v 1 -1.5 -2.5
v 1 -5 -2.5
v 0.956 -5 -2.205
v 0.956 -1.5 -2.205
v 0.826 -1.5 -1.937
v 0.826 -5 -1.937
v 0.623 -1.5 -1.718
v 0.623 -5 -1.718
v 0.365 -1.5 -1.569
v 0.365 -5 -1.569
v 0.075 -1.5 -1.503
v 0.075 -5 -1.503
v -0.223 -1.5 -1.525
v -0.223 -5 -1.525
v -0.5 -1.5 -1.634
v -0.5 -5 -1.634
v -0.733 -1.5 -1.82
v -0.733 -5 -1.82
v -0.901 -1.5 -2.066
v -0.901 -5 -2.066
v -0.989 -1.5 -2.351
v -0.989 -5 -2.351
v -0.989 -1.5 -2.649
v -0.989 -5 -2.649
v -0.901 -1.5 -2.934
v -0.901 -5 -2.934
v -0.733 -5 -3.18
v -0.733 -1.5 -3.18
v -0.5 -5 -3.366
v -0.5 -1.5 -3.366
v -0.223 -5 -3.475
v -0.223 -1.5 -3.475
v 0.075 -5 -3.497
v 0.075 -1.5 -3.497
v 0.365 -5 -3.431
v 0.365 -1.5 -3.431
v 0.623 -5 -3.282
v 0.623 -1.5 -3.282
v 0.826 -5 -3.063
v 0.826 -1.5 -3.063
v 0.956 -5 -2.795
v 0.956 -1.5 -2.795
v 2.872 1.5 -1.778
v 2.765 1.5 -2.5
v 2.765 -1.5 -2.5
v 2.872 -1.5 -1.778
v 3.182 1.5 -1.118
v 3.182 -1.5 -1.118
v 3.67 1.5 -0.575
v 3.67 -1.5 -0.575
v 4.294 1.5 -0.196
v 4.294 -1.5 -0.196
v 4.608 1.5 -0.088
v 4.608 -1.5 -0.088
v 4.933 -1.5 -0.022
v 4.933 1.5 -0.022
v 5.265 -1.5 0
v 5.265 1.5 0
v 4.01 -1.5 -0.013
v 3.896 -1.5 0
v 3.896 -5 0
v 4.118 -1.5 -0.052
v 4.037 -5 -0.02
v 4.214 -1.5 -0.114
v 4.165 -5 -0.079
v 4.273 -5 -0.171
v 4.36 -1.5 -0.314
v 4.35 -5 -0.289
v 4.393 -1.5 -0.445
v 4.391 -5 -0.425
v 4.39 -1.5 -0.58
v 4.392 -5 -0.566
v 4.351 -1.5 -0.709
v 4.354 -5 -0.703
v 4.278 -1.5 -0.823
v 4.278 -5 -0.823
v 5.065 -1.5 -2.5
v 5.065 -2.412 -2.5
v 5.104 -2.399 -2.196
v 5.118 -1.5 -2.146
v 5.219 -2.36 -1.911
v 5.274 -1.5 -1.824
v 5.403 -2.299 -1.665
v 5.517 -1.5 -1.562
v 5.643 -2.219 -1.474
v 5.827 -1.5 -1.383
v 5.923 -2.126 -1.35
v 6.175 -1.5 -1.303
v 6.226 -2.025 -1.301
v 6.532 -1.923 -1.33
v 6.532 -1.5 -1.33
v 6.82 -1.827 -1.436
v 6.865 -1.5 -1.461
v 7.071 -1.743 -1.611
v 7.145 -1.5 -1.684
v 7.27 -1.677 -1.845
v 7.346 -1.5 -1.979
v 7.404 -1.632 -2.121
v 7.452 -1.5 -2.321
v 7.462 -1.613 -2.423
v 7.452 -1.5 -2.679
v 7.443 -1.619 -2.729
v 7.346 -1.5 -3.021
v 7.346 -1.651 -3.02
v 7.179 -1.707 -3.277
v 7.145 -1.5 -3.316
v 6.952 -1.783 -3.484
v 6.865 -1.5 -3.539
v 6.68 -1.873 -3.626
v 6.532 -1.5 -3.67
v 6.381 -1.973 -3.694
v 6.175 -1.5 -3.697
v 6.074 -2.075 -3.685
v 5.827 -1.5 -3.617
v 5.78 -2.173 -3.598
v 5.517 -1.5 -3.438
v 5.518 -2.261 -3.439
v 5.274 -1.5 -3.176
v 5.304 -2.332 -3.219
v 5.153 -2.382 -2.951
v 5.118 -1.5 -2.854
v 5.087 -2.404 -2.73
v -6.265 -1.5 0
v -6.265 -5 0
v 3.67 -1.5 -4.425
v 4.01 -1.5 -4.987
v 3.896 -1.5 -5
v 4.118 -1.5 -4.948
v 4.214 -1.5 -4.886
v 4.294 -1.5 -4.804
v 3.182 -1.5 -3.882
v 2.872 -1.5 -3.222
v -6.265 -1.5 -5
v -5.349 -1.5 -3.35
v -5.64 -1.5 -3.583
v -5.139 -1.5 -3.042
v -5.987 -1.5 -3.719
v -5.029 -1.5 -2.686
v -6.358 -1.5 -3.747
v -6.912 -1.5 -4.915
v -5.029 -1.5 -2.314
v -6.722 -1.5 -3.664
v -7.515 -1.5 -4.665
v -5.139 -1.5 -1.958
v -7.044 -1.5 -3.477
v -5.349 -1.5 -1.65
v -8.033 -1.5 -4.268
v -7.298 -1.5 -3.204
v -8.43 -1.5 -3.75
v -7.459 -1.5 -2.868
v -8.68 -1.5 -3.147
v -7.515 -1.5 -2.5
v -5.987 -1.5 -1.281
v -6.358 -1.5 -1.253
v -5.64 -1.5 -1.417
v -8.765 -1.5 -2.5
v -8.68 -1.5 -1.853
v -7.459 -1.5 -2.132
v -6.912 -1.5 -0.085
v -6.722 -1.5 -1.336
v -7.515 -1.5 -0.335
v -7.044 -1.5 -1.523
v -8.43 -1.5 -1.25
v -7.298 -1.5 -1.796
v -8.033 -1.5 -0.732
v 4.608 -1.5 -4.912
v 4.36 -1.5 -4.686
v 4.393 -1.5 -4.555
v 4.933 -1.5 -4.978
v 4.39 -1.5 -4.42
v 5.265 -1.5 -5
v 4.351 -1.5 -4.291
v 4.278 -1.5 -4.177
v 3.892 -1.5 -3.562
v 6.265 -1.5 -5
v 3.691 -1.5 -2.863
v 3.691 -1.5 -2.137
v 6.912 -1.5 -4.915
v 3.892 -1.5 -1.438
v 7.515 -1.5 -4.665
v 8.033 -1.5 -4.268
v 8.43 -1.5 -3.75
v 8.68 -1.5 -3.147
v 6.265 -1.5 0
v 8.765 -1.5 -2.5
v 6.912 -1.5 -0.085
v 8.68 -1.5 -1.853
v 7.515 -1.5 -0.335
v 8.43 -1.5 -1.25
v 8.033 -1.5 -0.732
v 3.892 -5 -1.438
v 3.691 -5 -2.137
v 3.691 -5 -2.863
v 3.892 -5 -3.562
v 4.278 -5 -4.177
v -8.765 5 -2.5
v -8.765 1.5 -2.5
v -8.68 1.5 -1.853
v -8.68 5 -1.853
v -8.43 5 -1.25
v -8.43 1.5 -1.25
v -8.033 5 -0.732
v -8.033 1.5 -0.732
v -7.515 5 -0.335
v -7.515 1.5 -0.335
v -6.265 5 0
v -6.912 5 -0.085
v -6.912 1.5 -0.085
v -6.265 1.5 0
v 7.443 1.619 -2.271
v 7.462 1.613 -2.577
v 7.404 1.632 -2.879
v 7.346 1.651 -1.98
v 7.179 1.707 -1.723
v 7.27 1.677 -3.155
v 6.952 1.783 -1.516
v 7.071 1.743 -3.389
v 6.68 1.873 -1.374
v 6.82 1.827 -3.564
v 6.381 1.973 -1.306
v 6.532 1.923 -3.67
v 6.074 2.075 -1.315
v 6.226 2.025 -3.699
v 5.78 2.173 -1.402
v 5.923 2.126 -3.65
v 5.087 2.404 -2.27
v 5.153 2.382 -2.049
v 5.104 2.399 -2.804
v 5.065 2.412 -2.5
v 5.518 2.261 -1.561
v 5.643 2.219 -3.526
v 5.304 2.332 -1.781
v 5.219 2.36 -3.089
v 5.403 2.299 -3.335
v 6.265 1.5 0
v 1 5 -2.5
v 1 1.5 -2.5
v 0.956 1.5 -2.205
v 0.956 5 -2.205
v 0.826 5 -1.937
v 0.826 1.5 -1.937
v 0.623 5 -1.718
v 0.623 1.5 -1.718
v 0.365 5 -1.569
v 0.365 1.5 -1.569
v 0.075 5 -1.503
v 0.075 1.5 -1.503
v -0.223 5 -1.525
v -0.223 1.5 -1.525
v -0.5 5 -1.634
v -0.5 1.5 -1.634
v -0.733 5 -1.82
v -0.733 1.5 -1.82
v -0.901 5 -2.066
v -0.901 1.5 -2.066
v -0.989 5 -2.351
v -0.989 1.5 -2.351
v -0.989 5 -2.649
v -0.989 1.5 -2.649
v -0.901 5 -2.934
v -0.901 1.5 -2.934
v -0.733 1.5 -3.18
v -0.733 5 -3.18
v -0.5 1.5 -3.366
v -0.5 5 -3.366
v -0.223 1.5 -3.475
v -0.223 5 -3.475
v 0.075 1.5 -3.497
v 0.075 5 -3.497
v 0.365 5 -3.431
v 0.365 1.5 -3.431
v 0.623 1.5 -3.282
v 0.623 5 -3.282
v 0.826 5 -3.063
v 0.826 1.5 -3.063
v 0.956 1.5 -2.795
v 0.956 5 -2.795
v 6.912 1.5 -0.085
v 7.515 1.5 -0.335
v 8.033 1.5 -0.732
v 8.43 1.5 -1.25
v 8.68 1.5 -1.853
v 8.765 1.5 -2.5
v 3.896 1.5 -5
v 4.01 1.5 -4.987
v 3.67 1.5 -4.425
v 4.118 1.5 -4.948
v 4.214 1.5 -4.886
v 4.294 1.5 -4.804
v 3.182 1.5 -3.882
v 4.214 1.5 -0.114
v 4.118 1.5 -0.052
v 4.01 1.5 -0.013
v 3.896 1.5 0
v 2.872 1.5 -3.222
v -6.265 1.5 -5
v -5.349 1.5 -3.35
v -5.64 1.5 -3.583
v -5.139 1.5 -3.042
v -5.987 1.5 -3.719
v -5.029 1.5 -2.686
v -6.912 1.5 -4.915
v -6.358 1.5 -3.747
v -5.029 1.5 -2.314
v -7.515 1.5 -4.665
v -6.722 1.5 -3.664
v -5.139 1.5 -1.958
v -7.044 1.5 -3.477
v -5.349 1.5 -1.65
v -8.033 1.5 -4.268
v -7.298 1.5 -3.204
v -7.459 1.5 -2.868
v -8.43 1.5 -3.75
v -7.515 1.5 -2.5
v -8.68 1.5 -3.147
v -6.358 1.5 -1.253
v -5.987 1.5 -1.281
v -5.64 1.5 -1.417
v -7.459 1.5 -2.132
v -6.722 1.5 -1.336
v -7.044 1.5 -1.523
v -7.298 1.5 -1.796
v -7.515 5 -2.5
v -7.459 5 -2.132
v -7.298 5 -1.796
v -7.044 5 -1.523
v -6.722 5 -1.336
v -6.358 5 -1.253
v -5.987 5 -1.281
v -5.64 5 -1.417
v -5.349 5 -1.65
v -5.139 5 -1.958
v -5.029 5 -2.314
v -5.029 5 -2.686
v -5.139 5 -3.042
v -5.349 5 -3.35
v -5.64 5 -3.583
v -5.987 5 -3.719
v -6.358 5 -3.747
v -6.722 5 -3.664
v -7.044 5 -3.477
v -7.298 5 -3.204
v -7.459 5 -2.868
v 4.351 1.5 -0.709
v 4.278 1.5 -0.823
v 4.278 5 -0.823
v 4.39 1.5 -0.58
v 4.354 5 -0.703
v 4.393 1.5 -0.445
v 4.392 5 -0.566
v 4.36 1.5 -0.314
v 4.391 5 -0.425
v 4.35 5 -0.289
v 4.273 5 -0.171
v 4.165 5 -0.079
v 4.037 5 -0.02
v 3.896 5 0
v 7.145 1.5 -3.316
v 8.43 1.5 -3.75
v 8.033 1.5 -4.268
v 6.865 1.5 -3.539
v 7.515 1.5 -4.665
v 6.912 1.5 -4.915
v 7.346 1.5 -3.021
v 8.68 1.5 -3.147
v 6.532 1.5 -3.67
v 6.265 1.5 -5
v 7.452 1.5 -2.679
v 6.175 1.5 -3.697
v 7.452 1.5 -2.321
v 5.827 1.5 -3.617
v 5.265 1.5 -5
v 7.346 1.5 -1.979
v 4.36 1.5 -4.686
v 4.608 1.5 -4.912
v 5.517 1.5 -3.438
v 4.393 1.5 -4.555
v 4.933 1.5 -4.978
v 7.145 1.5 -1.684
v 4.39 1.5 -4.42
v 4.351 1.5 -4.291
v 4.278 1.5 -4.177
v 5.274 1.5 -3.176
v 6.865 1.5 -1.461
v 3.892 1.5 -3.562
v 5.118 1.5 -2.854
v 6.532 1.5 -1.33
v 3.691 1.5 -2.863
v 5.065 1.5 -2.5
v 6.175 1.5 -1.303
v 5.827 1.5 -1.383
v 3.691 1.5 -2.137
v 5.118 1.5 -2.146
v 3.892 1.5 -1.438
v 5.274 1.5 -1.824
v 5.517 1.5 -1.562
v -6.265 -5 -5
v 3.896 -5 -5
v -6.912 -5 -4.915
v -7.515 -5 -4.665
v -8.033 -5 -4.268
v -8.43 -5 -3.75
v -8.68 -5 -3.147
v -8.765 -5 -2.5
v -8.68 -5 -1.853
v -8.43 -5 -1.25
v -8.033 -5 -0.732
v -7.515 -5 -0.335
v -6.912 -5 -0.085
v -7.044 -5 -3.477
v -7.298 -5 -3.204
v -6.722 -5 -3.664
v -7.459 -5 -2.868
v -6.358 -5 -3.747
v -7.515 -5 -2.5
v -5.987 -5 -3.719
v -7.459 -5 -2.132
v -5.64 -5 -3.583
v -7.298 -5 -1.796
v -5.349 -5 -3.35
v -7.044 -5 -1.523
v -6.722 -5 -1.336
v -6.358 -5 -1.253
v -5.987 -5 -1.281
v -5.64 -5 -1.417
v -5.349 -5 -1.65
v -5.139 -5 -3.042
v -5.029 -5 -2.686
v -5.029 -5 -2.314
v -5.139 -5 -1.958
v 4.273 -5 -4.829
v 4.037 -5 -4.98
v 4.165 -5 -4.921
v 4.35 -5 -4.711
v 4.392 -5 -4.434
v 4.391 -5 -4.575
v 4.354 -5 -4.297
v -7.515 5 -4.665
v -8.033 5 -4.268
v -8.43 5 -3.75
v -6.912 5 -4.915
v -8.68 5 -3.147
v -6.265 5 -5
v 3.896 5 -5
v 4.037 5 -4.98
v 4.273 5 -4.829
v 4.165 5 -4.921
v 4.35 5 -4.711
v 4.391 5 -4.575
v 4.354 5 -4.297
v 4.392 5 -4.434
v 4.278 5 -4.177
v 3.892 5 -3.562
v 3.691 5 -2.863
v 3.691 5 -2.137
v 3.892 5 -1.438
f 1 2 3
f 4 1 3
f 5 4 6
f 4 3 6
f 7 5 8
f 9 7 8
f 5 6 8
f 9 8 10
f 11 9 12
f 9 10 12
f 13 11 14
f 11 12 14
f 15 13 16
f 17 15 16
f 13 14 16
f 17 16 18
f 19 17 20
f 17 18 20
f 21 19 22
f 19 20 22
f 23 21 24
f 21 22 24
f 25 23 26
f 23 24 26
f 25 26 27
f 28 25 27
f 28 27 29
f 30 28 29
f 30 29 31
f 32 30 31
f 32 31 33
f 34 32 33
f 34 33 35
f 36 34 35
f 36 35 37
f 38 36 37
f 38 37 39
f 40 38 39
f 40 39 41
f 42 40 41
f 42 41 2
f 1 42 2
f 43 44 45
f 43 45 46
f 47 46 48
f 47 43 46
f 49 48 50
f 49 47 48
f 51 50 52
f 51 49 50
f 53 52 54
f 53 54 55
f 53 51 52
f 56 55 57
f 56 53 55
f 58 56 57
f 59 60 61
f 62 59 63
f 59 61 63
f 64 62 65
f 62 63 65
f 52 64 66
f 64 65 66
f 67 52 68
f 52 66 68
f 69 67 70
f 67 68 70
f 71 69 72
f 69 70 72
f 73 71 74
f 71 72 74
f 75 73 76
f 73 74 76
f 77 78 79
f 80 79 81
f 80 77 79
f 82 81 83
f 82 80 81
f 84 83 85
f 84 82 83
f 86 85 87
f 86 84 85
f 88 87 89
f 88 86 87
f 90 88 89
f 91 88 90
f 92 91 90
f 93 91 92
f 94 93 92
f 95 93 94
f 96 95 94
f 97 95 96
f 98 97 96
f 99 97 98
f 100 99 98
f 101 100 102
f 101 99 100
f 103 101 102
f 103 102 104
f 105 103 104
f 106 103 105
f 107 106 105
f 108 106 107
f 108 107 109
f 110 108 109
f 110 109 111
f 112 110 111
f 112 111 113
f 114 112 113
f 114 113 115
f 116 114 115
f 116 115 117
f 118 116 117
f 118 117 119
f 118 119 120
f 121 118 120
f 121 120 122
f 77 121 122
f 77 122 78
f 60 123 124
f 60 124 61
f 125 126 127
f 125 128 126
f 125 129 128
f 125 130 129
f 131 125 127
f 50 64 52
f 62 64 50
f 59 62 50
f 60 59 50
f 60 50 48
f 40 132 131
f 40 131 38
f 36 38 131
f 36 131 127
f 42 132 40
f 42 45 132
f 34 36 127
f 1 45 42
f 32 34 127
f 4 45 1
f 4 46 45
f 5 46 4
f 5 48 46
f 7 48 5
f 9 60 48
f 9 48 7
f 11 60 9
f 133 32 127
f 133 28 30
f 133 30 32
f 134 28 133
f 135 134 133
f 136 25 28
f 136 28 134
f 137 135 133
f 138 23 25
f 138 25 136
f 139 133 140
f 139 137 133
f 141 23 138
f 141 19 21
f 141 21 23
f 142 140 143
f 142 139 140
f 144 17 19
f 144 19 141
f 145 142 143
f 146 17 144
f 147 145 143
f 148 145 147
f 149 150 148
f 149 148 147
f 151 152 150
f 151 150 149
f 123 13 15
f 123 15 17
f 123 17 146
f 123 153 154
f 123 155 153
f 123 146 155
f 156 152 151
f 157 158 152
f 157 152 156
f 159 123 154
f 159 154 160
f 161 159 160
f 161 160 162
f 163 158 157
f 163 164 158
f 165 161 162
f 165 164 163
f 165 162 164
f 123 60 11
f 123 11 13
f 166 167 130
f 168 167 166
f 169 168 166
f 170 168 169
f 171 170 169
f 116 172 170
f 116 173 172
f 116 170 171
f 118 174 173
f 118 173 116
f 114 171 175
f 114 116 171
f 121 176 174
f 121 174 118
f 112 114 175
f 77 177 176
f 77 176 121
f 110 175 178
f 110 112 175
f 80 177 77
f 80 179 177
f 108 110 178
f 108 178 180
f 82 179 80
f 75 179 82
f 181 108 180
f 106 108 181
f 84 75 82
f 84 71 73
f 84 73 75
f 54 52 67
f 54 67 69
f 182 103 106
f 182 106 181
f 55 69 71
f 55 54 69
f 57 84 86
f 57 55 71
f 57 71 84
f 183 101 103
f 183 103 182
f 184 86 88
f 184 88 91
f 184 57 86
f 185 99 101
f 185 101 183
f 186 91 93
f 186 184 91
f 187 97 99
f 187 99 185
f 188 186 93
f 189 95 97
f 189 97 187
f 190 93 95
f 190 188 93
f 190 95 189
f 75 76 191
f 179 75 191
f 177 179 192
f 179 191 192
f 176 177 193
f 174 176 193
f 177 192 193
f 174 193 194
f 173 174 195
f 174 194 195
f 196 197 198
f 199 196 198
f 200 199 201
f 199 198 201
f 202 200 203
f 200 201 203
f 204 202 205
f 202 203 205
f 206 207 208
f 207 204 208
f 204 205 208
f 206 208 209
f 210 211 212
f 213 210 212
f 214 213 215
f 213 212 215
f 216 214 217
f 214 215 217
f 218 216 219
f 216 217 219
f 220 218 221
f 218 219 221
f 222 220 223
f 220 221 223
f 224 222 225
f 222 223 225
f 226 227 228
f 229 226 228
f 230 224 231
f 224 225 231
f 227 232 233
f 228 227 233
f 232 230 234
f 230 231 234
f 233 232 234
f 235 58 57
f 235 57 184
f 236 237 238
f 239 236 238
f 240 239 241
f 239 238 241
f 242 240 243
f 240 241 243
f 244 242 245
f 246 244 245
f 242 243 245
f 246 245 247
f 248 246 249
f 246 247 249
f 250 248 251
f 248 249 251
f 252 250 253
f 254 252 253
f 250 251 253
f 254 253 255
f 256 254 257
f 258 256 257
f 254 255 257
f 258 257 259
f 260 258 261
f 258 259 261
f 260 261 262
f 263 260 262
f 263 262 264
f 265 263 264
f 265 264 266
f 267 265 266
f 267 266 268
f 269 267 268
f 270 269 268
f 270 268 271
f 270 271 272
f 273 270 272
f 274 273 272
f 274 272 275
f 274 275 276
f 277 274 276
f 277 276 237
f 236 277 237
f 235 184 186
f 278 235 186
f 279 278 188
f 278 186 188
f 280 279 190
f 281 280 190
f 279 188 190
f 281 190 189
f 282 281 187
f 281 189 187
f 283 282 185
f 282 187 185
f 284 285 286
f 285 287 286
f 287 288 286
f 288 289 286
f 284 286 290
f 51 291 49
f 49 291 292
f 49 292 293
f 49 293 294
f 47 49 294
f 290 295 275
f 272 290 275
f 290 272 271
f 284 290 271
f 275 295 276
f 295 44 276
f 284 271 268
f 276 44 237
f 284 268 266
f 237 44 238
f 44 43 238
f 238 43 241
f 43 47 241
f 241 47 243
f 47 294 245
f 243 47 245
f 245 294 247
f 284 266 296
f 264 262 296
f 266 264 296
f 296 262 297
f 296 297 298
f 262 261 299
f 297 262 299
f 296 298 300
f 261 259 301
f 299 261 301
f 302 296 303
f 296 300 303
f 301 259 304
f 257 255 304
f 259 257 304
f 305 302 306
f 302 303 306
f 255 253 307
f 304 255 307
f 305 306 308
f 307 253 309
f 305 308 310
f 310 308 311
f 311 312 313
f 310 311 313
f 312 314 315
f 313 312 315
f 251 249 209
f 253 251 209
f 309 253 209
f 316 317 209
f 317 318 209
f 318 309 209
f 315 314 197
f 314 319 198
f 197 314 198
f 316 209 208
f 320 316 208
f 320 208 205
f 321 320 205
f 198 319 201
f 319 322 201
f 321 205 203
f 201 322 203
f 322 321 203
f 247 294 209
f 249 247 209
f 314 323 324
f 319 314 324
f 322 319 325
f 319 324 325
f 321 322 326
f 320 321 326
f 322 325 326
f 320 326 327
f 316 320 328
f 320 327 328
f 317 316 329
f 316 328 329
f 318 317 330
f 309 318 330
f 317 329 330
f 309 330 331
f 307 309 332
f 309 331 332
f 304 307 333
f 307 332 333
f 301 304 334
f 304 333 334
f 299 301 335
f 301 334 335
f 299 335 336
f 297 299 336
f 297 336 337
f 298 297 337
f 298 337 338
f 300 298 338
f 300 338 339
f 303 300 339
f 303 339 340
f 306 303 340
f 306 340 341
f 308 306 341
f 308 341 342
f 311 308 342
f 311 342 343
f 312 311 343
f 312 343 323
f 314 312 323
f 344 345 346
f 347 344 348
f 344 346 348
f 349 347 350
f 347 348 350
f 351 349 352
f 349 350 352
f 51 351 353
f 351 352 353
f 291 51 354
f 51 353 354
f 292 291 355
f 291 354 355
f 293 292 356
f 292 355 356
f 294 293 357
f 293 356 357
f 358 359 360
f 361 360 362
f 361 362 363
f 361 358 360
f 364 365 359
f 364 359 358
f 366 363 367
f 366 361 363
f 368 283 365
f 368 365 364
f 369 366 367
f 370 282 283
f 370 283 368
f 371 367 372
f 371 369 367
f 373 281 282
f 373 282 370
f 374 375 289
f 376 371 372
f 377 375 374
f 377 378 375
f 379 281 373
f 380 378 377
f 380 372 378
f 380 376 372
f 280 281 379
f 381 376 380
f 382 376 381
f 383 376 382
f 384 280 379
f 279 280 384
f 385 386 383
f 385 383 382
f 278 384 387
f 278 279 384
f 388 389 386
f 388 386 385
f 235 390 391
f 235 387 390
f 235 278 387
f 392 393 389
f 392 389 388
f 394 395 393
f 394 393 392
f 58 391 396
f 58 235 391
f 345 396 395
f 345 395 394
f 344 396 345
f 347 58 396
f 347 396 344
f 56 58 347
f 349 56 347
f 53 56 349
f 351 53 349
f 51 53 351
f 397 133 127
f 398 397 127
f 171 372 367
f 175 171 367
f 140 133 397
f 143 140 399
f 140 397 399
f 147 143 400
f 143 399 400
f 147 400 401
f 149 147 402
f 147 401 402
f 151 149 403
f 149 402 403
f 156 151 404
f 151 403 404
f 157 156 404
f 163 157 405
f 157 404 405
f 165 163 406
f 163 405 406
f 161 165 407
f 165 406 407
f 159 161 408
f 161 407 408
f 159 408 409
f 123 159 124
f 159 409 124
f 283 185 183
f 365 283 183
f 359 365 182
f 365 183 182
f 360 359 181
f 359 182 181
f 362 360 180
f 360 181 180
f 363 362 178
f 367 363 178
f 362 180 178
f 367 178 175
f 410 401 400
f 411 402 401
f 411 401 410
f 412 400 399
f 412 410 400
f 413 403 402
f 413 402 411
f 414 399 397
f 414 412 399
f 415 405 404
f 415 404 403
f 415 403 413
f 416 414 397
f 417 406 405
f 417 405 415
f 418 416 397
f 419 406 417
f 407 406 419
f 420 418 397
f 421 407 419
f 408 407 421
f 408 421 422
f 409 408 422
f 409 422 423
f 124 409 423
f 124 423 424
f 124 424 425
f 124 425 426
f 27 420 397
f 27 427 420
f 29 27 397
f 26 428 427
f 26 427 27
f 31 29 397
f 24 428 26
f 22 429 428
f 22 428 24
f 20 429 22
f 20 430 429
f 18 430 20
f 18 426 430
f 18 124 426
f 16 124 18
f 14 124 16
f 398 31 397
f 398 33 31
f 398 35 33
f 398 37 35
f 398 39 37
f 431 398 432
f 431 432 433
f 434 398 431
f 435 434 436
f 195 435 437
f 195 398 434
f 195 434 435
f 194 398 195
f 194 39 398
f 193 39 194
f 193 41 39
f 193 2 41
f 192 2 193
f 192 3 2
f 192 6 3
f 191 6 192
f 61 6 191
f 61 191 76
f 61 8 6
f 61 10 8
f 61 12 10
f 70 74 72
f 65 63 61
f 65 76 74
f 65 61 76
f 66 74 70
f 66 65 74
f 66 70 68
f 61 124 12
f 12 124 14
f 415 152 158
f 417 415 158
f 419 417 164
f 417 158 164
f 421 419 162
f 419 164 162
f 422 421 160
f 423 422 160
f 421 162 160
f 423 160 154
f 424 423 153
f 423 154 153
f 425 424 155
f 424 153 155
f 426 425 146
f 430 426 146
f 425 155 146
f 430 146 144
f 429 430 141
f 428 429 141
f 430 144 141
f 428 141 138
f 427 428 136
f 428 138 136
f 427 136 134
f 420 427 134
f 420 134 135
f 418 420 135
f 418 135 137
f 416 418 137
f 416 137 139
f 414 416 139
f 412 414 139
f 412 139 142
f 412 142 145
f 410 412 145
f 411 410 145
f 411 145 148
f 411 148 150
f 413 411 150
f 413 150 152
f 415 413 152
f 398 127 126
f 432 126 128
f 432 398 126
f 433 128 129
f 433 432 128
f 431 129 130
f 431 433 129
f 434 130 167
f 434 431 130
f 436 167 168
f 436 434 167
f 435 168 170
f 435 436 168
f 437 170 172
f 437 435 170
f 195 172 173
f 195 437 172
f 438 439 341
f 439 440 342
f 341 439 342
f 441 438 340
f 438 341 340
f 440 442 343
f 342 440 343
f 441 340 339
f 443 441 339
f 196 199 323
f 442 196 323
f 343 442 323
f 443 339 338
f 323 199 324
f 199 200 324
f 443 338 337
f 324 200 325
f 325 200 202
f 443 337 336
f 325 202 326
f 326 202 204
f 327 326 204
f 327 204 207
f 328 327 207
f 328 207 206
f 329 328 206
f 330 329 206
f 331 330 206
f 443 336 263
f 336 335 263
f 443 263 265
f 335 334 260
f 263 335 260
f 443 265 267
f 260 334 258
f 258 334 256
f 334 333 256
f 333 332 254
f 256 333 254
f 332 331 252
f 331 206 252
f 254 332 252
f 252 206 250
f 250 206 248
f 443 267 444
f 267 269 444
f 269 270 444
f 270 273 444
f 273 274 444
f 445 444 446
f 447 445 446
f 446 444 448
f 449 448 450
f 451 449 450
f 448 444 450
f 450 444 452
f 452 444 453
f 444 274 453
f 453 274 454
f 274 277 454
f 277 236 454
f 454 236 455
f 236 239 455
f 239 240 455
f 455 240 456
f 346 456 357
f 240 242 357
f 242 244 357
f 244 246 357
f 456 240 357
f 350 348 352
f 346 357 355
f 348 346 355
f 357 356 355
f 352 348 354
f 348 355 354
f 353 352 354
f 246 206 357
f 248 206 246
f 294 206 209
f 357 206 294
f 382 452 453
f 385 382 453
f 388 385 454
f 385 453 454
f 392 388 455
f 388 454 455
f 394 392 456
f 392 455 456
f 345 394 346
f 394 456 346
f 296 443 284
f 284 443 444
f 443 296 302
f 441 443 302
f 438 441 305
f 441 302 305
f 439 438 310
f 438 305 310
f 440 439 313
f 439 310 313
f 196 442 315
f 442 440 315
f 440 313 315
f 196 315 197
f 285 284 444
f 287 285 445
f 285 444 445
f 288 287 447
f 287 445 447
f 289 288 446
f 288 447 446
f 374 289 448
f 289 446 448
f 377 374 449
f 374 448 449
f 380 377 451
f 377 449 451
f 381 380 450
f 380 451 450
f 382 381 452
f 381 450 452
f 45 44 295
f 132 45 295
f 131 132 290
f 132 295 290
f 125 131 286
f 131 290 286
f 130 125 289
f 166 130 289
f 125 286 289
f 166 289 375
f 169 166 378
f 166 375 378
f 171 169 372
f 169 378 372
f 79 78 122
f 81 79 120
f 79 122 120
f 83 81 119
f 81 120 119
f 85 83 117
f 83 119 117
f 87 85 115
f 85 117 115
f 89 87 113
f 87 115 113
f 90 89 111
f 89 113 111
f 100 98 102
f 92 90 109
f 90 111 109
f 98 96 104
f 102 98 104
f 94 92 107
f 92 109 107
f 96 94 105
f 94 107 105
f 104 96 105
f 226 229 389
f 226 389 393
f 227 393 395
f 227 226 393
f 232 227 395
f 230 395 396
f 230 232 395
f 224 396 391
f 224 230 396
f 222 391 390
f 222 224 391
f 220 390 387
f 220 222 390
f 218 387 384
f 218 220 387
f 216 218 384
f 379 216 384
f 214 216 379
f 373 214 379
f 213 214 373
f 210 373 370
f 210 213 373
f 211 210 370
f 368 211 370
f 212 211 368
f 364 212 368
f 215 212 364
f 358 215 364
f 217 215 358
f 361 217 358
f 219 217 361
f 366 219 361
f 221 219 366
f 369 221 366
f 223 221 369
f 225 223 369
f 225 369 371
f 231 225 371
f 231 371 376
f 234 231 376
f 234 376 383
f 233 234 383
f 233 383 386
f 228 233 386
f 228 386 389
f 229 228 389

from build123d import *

# Parameters (mm, degrees)
F0_W         = 17.53
F0_H         = 10
F1_DEPTH     = 5
F3_DEPTH     = 10.001
F4_R         = 1.25
F5_DEPTH     = 10.001
F6_R         = 2.6
F7_DEPTH     = 3.5
F8_R         = 2.6
F9_DEPTH     = 3.5
F10_W        = 14.03
F10_H        = 3
F11_DEPTH    = 5.001
F12_R        = 1.2
F13_DEPTH    = 10
F14_R        = 0.5
F16_DEPTH    = 5.001
F17_T1_DEPTH = 3
F18_R        = 1
F19_DEPTH    = 10.001


# Not quite as in the source:
# - a fillet or chamfer that OpenCascade refuses, or shapes differently, is made with other operations: its cross-section is extruded or revolved along the edge and cut away or added


with BuildPart() as f1:
    # F0 (on Top) → F1 (new body)
    with BuildSketch(Plane.XY):
        Rectangle(F0_W, F0_H)
    extrude(amount=-F1_DEPTH)

    # F2 (on face) → F3 (cut, through all)
    with BuildSketch(Plane.XZ.offset(5)):
        with BuildLine():
            Line((8.765, 0), (6.265, 0))
            ThreePointArc((6.265, 0), (8.032766953, -0.732233047), (8.765, -2.5))
            Line((8.765, -2.5), (8.765, 0))
        make_face()
        with BuildLine():
            Line((8.765, -5), (8.765, -2.5))
            ThreePointArc((8.765, -2.5), (8.032766953, -4.267766953), (6.265, -5))
            Line((6.265, -5), (8.765, -5))
        make_face()
        with BuildLine():
            ThreePointArc((-6.265, -5), (-8.032766953, -4.267766953), (-8.765, -2.5))
            Line((-8.765, -2.5), (-8.765, -5))
            Line((-8.765, -5), (-6.265, -5))
        make_face()
        with BuildLine():
            ThreePointArc((-8.765, -2.5), (-8.032766953, -0.732233047), (-6.265, 0))
            Line((-6.265, 0), (-8.765, 0))
            Line((-8.765, 0), (-8.765, -2.5))
        make_face()
    extrude(amount=-F3_DEPTH, mode=Mode.SUBTRACT)

    # F4 (on face) → F5 (cut, through all)
    with BuildSketch(Plane(origin=(0, 5, 0), x_dir=(-1, 0, 0), z_dir=(0, 1, 0))):
        with Locations((6.265, -2.5)):
            Circle(F4_R)
    extrude(amount=-F5_DEPTH, mode=Mode.SUBTRACT)

    # F6 (on face) → F7 (cut)
    with BuildSketch(Plane(origin=(0, 5, 0), x_dir=(-1, 0, 0), z_dir=(0, 1, 0))):
        with Locations((-6.265, -2.5)):
            Circle(F6_R)
    extrude(amount=-F7_DEPTH, mode=Mode.SUBTRACT)

    # F8 (on face) → F9 (cut)
    with BuildSketch(Plane.XZ.offset(5)):
        with Locations((6.265, -2.5)):
            Circle(F8_R)
    extrude(amount=-F9_DEPTH, mode=Mode.SUBTRACT)

    # F10 (on face) → F11 (cut, through all)
    with BuildSketch(Plane.XY):
        with Locations((-4.25, 0)):
            Rectangle(F10_W, F10_H)
    extrude(amount=-F11_DEPTH, mode=Mode.SUBTRACT)

    # F12 (on face) → F13 (join)
    with BuildSketch(Plane(origin=(0, 5, 0), x_dir=(-1, 0, 0), z_dir=(0, 1, 0))):
        with Locations((-6.265, -2.5)):
            Circle(F12_R)
    extrude(amount=-F13_DEPTH)

    # F14
    f14_edges = [f1.edges().sort_by_distance(p)[0] for p in [
        (5.550857, 3.25, 0),
        (5.550857, -3.25, 0),
        (5.550857, -3.25, -5),
        (5.550857, 3.25, -5),
    ]]
    fillet(f14_edges, radius=F14_R)

    # F15 (on face) → F16 (cut, through all)
    with BuildSketch(Plane(origin=(0, 0, -5), x_dir=(1, 0, 0), z_dir=(0, 0, -1))):
        Polygon((8, 2.4762265265), (8, 5.5), (4.8, 5.5), (4.8, 2.5), (7.8, 1.5), align=None)
        Polygon((4.8, -5.5), (8, -5.5), (8, -2.4762265265), (7.8, -1.5), (4.8, -2.5), align=None)
    extrude(amount=-F16_DEPTH, mode=Mode.SUBTRACT)

    # F17: fillet of radius 2.5 on 2 edges, made by hand

    # F17_s2 → F17_t1 (cut)
    with BuildSketch(Plane.XZ.offset(-1.5)):
        with BuildLine():
            ThreePointArc((2.765, -2.5), (3.497233047, -0.732233047), (5.265, 0))
            Line((5.265, 0), (2.765, 0))
            Line((2.765, 0), (2.765, -2.5))
        make_face()
        with BuildLine():
            ThreePointArc((2.765, -2.5), (3.497233047, -4.267766953), (5.265, -5))
            Line((5.265, -5), (2.765, -5))
            Line((2.765, -5), (2.765, -2.5))
        make_face()
    extrude(amount=F17_T1_DEPTH, mode=Mode.SUBTRACT)

    # F18 (on face) → F19 (cut, through all)
    with BuildSketch(Plane.XZ.offset(5)):
        with Locations((0, -2.5)):
            Circle(F18_R)
    extrude(amount=-F19_DEPTH, mode=Mode.SUBTRACT)


solid = f1.part
